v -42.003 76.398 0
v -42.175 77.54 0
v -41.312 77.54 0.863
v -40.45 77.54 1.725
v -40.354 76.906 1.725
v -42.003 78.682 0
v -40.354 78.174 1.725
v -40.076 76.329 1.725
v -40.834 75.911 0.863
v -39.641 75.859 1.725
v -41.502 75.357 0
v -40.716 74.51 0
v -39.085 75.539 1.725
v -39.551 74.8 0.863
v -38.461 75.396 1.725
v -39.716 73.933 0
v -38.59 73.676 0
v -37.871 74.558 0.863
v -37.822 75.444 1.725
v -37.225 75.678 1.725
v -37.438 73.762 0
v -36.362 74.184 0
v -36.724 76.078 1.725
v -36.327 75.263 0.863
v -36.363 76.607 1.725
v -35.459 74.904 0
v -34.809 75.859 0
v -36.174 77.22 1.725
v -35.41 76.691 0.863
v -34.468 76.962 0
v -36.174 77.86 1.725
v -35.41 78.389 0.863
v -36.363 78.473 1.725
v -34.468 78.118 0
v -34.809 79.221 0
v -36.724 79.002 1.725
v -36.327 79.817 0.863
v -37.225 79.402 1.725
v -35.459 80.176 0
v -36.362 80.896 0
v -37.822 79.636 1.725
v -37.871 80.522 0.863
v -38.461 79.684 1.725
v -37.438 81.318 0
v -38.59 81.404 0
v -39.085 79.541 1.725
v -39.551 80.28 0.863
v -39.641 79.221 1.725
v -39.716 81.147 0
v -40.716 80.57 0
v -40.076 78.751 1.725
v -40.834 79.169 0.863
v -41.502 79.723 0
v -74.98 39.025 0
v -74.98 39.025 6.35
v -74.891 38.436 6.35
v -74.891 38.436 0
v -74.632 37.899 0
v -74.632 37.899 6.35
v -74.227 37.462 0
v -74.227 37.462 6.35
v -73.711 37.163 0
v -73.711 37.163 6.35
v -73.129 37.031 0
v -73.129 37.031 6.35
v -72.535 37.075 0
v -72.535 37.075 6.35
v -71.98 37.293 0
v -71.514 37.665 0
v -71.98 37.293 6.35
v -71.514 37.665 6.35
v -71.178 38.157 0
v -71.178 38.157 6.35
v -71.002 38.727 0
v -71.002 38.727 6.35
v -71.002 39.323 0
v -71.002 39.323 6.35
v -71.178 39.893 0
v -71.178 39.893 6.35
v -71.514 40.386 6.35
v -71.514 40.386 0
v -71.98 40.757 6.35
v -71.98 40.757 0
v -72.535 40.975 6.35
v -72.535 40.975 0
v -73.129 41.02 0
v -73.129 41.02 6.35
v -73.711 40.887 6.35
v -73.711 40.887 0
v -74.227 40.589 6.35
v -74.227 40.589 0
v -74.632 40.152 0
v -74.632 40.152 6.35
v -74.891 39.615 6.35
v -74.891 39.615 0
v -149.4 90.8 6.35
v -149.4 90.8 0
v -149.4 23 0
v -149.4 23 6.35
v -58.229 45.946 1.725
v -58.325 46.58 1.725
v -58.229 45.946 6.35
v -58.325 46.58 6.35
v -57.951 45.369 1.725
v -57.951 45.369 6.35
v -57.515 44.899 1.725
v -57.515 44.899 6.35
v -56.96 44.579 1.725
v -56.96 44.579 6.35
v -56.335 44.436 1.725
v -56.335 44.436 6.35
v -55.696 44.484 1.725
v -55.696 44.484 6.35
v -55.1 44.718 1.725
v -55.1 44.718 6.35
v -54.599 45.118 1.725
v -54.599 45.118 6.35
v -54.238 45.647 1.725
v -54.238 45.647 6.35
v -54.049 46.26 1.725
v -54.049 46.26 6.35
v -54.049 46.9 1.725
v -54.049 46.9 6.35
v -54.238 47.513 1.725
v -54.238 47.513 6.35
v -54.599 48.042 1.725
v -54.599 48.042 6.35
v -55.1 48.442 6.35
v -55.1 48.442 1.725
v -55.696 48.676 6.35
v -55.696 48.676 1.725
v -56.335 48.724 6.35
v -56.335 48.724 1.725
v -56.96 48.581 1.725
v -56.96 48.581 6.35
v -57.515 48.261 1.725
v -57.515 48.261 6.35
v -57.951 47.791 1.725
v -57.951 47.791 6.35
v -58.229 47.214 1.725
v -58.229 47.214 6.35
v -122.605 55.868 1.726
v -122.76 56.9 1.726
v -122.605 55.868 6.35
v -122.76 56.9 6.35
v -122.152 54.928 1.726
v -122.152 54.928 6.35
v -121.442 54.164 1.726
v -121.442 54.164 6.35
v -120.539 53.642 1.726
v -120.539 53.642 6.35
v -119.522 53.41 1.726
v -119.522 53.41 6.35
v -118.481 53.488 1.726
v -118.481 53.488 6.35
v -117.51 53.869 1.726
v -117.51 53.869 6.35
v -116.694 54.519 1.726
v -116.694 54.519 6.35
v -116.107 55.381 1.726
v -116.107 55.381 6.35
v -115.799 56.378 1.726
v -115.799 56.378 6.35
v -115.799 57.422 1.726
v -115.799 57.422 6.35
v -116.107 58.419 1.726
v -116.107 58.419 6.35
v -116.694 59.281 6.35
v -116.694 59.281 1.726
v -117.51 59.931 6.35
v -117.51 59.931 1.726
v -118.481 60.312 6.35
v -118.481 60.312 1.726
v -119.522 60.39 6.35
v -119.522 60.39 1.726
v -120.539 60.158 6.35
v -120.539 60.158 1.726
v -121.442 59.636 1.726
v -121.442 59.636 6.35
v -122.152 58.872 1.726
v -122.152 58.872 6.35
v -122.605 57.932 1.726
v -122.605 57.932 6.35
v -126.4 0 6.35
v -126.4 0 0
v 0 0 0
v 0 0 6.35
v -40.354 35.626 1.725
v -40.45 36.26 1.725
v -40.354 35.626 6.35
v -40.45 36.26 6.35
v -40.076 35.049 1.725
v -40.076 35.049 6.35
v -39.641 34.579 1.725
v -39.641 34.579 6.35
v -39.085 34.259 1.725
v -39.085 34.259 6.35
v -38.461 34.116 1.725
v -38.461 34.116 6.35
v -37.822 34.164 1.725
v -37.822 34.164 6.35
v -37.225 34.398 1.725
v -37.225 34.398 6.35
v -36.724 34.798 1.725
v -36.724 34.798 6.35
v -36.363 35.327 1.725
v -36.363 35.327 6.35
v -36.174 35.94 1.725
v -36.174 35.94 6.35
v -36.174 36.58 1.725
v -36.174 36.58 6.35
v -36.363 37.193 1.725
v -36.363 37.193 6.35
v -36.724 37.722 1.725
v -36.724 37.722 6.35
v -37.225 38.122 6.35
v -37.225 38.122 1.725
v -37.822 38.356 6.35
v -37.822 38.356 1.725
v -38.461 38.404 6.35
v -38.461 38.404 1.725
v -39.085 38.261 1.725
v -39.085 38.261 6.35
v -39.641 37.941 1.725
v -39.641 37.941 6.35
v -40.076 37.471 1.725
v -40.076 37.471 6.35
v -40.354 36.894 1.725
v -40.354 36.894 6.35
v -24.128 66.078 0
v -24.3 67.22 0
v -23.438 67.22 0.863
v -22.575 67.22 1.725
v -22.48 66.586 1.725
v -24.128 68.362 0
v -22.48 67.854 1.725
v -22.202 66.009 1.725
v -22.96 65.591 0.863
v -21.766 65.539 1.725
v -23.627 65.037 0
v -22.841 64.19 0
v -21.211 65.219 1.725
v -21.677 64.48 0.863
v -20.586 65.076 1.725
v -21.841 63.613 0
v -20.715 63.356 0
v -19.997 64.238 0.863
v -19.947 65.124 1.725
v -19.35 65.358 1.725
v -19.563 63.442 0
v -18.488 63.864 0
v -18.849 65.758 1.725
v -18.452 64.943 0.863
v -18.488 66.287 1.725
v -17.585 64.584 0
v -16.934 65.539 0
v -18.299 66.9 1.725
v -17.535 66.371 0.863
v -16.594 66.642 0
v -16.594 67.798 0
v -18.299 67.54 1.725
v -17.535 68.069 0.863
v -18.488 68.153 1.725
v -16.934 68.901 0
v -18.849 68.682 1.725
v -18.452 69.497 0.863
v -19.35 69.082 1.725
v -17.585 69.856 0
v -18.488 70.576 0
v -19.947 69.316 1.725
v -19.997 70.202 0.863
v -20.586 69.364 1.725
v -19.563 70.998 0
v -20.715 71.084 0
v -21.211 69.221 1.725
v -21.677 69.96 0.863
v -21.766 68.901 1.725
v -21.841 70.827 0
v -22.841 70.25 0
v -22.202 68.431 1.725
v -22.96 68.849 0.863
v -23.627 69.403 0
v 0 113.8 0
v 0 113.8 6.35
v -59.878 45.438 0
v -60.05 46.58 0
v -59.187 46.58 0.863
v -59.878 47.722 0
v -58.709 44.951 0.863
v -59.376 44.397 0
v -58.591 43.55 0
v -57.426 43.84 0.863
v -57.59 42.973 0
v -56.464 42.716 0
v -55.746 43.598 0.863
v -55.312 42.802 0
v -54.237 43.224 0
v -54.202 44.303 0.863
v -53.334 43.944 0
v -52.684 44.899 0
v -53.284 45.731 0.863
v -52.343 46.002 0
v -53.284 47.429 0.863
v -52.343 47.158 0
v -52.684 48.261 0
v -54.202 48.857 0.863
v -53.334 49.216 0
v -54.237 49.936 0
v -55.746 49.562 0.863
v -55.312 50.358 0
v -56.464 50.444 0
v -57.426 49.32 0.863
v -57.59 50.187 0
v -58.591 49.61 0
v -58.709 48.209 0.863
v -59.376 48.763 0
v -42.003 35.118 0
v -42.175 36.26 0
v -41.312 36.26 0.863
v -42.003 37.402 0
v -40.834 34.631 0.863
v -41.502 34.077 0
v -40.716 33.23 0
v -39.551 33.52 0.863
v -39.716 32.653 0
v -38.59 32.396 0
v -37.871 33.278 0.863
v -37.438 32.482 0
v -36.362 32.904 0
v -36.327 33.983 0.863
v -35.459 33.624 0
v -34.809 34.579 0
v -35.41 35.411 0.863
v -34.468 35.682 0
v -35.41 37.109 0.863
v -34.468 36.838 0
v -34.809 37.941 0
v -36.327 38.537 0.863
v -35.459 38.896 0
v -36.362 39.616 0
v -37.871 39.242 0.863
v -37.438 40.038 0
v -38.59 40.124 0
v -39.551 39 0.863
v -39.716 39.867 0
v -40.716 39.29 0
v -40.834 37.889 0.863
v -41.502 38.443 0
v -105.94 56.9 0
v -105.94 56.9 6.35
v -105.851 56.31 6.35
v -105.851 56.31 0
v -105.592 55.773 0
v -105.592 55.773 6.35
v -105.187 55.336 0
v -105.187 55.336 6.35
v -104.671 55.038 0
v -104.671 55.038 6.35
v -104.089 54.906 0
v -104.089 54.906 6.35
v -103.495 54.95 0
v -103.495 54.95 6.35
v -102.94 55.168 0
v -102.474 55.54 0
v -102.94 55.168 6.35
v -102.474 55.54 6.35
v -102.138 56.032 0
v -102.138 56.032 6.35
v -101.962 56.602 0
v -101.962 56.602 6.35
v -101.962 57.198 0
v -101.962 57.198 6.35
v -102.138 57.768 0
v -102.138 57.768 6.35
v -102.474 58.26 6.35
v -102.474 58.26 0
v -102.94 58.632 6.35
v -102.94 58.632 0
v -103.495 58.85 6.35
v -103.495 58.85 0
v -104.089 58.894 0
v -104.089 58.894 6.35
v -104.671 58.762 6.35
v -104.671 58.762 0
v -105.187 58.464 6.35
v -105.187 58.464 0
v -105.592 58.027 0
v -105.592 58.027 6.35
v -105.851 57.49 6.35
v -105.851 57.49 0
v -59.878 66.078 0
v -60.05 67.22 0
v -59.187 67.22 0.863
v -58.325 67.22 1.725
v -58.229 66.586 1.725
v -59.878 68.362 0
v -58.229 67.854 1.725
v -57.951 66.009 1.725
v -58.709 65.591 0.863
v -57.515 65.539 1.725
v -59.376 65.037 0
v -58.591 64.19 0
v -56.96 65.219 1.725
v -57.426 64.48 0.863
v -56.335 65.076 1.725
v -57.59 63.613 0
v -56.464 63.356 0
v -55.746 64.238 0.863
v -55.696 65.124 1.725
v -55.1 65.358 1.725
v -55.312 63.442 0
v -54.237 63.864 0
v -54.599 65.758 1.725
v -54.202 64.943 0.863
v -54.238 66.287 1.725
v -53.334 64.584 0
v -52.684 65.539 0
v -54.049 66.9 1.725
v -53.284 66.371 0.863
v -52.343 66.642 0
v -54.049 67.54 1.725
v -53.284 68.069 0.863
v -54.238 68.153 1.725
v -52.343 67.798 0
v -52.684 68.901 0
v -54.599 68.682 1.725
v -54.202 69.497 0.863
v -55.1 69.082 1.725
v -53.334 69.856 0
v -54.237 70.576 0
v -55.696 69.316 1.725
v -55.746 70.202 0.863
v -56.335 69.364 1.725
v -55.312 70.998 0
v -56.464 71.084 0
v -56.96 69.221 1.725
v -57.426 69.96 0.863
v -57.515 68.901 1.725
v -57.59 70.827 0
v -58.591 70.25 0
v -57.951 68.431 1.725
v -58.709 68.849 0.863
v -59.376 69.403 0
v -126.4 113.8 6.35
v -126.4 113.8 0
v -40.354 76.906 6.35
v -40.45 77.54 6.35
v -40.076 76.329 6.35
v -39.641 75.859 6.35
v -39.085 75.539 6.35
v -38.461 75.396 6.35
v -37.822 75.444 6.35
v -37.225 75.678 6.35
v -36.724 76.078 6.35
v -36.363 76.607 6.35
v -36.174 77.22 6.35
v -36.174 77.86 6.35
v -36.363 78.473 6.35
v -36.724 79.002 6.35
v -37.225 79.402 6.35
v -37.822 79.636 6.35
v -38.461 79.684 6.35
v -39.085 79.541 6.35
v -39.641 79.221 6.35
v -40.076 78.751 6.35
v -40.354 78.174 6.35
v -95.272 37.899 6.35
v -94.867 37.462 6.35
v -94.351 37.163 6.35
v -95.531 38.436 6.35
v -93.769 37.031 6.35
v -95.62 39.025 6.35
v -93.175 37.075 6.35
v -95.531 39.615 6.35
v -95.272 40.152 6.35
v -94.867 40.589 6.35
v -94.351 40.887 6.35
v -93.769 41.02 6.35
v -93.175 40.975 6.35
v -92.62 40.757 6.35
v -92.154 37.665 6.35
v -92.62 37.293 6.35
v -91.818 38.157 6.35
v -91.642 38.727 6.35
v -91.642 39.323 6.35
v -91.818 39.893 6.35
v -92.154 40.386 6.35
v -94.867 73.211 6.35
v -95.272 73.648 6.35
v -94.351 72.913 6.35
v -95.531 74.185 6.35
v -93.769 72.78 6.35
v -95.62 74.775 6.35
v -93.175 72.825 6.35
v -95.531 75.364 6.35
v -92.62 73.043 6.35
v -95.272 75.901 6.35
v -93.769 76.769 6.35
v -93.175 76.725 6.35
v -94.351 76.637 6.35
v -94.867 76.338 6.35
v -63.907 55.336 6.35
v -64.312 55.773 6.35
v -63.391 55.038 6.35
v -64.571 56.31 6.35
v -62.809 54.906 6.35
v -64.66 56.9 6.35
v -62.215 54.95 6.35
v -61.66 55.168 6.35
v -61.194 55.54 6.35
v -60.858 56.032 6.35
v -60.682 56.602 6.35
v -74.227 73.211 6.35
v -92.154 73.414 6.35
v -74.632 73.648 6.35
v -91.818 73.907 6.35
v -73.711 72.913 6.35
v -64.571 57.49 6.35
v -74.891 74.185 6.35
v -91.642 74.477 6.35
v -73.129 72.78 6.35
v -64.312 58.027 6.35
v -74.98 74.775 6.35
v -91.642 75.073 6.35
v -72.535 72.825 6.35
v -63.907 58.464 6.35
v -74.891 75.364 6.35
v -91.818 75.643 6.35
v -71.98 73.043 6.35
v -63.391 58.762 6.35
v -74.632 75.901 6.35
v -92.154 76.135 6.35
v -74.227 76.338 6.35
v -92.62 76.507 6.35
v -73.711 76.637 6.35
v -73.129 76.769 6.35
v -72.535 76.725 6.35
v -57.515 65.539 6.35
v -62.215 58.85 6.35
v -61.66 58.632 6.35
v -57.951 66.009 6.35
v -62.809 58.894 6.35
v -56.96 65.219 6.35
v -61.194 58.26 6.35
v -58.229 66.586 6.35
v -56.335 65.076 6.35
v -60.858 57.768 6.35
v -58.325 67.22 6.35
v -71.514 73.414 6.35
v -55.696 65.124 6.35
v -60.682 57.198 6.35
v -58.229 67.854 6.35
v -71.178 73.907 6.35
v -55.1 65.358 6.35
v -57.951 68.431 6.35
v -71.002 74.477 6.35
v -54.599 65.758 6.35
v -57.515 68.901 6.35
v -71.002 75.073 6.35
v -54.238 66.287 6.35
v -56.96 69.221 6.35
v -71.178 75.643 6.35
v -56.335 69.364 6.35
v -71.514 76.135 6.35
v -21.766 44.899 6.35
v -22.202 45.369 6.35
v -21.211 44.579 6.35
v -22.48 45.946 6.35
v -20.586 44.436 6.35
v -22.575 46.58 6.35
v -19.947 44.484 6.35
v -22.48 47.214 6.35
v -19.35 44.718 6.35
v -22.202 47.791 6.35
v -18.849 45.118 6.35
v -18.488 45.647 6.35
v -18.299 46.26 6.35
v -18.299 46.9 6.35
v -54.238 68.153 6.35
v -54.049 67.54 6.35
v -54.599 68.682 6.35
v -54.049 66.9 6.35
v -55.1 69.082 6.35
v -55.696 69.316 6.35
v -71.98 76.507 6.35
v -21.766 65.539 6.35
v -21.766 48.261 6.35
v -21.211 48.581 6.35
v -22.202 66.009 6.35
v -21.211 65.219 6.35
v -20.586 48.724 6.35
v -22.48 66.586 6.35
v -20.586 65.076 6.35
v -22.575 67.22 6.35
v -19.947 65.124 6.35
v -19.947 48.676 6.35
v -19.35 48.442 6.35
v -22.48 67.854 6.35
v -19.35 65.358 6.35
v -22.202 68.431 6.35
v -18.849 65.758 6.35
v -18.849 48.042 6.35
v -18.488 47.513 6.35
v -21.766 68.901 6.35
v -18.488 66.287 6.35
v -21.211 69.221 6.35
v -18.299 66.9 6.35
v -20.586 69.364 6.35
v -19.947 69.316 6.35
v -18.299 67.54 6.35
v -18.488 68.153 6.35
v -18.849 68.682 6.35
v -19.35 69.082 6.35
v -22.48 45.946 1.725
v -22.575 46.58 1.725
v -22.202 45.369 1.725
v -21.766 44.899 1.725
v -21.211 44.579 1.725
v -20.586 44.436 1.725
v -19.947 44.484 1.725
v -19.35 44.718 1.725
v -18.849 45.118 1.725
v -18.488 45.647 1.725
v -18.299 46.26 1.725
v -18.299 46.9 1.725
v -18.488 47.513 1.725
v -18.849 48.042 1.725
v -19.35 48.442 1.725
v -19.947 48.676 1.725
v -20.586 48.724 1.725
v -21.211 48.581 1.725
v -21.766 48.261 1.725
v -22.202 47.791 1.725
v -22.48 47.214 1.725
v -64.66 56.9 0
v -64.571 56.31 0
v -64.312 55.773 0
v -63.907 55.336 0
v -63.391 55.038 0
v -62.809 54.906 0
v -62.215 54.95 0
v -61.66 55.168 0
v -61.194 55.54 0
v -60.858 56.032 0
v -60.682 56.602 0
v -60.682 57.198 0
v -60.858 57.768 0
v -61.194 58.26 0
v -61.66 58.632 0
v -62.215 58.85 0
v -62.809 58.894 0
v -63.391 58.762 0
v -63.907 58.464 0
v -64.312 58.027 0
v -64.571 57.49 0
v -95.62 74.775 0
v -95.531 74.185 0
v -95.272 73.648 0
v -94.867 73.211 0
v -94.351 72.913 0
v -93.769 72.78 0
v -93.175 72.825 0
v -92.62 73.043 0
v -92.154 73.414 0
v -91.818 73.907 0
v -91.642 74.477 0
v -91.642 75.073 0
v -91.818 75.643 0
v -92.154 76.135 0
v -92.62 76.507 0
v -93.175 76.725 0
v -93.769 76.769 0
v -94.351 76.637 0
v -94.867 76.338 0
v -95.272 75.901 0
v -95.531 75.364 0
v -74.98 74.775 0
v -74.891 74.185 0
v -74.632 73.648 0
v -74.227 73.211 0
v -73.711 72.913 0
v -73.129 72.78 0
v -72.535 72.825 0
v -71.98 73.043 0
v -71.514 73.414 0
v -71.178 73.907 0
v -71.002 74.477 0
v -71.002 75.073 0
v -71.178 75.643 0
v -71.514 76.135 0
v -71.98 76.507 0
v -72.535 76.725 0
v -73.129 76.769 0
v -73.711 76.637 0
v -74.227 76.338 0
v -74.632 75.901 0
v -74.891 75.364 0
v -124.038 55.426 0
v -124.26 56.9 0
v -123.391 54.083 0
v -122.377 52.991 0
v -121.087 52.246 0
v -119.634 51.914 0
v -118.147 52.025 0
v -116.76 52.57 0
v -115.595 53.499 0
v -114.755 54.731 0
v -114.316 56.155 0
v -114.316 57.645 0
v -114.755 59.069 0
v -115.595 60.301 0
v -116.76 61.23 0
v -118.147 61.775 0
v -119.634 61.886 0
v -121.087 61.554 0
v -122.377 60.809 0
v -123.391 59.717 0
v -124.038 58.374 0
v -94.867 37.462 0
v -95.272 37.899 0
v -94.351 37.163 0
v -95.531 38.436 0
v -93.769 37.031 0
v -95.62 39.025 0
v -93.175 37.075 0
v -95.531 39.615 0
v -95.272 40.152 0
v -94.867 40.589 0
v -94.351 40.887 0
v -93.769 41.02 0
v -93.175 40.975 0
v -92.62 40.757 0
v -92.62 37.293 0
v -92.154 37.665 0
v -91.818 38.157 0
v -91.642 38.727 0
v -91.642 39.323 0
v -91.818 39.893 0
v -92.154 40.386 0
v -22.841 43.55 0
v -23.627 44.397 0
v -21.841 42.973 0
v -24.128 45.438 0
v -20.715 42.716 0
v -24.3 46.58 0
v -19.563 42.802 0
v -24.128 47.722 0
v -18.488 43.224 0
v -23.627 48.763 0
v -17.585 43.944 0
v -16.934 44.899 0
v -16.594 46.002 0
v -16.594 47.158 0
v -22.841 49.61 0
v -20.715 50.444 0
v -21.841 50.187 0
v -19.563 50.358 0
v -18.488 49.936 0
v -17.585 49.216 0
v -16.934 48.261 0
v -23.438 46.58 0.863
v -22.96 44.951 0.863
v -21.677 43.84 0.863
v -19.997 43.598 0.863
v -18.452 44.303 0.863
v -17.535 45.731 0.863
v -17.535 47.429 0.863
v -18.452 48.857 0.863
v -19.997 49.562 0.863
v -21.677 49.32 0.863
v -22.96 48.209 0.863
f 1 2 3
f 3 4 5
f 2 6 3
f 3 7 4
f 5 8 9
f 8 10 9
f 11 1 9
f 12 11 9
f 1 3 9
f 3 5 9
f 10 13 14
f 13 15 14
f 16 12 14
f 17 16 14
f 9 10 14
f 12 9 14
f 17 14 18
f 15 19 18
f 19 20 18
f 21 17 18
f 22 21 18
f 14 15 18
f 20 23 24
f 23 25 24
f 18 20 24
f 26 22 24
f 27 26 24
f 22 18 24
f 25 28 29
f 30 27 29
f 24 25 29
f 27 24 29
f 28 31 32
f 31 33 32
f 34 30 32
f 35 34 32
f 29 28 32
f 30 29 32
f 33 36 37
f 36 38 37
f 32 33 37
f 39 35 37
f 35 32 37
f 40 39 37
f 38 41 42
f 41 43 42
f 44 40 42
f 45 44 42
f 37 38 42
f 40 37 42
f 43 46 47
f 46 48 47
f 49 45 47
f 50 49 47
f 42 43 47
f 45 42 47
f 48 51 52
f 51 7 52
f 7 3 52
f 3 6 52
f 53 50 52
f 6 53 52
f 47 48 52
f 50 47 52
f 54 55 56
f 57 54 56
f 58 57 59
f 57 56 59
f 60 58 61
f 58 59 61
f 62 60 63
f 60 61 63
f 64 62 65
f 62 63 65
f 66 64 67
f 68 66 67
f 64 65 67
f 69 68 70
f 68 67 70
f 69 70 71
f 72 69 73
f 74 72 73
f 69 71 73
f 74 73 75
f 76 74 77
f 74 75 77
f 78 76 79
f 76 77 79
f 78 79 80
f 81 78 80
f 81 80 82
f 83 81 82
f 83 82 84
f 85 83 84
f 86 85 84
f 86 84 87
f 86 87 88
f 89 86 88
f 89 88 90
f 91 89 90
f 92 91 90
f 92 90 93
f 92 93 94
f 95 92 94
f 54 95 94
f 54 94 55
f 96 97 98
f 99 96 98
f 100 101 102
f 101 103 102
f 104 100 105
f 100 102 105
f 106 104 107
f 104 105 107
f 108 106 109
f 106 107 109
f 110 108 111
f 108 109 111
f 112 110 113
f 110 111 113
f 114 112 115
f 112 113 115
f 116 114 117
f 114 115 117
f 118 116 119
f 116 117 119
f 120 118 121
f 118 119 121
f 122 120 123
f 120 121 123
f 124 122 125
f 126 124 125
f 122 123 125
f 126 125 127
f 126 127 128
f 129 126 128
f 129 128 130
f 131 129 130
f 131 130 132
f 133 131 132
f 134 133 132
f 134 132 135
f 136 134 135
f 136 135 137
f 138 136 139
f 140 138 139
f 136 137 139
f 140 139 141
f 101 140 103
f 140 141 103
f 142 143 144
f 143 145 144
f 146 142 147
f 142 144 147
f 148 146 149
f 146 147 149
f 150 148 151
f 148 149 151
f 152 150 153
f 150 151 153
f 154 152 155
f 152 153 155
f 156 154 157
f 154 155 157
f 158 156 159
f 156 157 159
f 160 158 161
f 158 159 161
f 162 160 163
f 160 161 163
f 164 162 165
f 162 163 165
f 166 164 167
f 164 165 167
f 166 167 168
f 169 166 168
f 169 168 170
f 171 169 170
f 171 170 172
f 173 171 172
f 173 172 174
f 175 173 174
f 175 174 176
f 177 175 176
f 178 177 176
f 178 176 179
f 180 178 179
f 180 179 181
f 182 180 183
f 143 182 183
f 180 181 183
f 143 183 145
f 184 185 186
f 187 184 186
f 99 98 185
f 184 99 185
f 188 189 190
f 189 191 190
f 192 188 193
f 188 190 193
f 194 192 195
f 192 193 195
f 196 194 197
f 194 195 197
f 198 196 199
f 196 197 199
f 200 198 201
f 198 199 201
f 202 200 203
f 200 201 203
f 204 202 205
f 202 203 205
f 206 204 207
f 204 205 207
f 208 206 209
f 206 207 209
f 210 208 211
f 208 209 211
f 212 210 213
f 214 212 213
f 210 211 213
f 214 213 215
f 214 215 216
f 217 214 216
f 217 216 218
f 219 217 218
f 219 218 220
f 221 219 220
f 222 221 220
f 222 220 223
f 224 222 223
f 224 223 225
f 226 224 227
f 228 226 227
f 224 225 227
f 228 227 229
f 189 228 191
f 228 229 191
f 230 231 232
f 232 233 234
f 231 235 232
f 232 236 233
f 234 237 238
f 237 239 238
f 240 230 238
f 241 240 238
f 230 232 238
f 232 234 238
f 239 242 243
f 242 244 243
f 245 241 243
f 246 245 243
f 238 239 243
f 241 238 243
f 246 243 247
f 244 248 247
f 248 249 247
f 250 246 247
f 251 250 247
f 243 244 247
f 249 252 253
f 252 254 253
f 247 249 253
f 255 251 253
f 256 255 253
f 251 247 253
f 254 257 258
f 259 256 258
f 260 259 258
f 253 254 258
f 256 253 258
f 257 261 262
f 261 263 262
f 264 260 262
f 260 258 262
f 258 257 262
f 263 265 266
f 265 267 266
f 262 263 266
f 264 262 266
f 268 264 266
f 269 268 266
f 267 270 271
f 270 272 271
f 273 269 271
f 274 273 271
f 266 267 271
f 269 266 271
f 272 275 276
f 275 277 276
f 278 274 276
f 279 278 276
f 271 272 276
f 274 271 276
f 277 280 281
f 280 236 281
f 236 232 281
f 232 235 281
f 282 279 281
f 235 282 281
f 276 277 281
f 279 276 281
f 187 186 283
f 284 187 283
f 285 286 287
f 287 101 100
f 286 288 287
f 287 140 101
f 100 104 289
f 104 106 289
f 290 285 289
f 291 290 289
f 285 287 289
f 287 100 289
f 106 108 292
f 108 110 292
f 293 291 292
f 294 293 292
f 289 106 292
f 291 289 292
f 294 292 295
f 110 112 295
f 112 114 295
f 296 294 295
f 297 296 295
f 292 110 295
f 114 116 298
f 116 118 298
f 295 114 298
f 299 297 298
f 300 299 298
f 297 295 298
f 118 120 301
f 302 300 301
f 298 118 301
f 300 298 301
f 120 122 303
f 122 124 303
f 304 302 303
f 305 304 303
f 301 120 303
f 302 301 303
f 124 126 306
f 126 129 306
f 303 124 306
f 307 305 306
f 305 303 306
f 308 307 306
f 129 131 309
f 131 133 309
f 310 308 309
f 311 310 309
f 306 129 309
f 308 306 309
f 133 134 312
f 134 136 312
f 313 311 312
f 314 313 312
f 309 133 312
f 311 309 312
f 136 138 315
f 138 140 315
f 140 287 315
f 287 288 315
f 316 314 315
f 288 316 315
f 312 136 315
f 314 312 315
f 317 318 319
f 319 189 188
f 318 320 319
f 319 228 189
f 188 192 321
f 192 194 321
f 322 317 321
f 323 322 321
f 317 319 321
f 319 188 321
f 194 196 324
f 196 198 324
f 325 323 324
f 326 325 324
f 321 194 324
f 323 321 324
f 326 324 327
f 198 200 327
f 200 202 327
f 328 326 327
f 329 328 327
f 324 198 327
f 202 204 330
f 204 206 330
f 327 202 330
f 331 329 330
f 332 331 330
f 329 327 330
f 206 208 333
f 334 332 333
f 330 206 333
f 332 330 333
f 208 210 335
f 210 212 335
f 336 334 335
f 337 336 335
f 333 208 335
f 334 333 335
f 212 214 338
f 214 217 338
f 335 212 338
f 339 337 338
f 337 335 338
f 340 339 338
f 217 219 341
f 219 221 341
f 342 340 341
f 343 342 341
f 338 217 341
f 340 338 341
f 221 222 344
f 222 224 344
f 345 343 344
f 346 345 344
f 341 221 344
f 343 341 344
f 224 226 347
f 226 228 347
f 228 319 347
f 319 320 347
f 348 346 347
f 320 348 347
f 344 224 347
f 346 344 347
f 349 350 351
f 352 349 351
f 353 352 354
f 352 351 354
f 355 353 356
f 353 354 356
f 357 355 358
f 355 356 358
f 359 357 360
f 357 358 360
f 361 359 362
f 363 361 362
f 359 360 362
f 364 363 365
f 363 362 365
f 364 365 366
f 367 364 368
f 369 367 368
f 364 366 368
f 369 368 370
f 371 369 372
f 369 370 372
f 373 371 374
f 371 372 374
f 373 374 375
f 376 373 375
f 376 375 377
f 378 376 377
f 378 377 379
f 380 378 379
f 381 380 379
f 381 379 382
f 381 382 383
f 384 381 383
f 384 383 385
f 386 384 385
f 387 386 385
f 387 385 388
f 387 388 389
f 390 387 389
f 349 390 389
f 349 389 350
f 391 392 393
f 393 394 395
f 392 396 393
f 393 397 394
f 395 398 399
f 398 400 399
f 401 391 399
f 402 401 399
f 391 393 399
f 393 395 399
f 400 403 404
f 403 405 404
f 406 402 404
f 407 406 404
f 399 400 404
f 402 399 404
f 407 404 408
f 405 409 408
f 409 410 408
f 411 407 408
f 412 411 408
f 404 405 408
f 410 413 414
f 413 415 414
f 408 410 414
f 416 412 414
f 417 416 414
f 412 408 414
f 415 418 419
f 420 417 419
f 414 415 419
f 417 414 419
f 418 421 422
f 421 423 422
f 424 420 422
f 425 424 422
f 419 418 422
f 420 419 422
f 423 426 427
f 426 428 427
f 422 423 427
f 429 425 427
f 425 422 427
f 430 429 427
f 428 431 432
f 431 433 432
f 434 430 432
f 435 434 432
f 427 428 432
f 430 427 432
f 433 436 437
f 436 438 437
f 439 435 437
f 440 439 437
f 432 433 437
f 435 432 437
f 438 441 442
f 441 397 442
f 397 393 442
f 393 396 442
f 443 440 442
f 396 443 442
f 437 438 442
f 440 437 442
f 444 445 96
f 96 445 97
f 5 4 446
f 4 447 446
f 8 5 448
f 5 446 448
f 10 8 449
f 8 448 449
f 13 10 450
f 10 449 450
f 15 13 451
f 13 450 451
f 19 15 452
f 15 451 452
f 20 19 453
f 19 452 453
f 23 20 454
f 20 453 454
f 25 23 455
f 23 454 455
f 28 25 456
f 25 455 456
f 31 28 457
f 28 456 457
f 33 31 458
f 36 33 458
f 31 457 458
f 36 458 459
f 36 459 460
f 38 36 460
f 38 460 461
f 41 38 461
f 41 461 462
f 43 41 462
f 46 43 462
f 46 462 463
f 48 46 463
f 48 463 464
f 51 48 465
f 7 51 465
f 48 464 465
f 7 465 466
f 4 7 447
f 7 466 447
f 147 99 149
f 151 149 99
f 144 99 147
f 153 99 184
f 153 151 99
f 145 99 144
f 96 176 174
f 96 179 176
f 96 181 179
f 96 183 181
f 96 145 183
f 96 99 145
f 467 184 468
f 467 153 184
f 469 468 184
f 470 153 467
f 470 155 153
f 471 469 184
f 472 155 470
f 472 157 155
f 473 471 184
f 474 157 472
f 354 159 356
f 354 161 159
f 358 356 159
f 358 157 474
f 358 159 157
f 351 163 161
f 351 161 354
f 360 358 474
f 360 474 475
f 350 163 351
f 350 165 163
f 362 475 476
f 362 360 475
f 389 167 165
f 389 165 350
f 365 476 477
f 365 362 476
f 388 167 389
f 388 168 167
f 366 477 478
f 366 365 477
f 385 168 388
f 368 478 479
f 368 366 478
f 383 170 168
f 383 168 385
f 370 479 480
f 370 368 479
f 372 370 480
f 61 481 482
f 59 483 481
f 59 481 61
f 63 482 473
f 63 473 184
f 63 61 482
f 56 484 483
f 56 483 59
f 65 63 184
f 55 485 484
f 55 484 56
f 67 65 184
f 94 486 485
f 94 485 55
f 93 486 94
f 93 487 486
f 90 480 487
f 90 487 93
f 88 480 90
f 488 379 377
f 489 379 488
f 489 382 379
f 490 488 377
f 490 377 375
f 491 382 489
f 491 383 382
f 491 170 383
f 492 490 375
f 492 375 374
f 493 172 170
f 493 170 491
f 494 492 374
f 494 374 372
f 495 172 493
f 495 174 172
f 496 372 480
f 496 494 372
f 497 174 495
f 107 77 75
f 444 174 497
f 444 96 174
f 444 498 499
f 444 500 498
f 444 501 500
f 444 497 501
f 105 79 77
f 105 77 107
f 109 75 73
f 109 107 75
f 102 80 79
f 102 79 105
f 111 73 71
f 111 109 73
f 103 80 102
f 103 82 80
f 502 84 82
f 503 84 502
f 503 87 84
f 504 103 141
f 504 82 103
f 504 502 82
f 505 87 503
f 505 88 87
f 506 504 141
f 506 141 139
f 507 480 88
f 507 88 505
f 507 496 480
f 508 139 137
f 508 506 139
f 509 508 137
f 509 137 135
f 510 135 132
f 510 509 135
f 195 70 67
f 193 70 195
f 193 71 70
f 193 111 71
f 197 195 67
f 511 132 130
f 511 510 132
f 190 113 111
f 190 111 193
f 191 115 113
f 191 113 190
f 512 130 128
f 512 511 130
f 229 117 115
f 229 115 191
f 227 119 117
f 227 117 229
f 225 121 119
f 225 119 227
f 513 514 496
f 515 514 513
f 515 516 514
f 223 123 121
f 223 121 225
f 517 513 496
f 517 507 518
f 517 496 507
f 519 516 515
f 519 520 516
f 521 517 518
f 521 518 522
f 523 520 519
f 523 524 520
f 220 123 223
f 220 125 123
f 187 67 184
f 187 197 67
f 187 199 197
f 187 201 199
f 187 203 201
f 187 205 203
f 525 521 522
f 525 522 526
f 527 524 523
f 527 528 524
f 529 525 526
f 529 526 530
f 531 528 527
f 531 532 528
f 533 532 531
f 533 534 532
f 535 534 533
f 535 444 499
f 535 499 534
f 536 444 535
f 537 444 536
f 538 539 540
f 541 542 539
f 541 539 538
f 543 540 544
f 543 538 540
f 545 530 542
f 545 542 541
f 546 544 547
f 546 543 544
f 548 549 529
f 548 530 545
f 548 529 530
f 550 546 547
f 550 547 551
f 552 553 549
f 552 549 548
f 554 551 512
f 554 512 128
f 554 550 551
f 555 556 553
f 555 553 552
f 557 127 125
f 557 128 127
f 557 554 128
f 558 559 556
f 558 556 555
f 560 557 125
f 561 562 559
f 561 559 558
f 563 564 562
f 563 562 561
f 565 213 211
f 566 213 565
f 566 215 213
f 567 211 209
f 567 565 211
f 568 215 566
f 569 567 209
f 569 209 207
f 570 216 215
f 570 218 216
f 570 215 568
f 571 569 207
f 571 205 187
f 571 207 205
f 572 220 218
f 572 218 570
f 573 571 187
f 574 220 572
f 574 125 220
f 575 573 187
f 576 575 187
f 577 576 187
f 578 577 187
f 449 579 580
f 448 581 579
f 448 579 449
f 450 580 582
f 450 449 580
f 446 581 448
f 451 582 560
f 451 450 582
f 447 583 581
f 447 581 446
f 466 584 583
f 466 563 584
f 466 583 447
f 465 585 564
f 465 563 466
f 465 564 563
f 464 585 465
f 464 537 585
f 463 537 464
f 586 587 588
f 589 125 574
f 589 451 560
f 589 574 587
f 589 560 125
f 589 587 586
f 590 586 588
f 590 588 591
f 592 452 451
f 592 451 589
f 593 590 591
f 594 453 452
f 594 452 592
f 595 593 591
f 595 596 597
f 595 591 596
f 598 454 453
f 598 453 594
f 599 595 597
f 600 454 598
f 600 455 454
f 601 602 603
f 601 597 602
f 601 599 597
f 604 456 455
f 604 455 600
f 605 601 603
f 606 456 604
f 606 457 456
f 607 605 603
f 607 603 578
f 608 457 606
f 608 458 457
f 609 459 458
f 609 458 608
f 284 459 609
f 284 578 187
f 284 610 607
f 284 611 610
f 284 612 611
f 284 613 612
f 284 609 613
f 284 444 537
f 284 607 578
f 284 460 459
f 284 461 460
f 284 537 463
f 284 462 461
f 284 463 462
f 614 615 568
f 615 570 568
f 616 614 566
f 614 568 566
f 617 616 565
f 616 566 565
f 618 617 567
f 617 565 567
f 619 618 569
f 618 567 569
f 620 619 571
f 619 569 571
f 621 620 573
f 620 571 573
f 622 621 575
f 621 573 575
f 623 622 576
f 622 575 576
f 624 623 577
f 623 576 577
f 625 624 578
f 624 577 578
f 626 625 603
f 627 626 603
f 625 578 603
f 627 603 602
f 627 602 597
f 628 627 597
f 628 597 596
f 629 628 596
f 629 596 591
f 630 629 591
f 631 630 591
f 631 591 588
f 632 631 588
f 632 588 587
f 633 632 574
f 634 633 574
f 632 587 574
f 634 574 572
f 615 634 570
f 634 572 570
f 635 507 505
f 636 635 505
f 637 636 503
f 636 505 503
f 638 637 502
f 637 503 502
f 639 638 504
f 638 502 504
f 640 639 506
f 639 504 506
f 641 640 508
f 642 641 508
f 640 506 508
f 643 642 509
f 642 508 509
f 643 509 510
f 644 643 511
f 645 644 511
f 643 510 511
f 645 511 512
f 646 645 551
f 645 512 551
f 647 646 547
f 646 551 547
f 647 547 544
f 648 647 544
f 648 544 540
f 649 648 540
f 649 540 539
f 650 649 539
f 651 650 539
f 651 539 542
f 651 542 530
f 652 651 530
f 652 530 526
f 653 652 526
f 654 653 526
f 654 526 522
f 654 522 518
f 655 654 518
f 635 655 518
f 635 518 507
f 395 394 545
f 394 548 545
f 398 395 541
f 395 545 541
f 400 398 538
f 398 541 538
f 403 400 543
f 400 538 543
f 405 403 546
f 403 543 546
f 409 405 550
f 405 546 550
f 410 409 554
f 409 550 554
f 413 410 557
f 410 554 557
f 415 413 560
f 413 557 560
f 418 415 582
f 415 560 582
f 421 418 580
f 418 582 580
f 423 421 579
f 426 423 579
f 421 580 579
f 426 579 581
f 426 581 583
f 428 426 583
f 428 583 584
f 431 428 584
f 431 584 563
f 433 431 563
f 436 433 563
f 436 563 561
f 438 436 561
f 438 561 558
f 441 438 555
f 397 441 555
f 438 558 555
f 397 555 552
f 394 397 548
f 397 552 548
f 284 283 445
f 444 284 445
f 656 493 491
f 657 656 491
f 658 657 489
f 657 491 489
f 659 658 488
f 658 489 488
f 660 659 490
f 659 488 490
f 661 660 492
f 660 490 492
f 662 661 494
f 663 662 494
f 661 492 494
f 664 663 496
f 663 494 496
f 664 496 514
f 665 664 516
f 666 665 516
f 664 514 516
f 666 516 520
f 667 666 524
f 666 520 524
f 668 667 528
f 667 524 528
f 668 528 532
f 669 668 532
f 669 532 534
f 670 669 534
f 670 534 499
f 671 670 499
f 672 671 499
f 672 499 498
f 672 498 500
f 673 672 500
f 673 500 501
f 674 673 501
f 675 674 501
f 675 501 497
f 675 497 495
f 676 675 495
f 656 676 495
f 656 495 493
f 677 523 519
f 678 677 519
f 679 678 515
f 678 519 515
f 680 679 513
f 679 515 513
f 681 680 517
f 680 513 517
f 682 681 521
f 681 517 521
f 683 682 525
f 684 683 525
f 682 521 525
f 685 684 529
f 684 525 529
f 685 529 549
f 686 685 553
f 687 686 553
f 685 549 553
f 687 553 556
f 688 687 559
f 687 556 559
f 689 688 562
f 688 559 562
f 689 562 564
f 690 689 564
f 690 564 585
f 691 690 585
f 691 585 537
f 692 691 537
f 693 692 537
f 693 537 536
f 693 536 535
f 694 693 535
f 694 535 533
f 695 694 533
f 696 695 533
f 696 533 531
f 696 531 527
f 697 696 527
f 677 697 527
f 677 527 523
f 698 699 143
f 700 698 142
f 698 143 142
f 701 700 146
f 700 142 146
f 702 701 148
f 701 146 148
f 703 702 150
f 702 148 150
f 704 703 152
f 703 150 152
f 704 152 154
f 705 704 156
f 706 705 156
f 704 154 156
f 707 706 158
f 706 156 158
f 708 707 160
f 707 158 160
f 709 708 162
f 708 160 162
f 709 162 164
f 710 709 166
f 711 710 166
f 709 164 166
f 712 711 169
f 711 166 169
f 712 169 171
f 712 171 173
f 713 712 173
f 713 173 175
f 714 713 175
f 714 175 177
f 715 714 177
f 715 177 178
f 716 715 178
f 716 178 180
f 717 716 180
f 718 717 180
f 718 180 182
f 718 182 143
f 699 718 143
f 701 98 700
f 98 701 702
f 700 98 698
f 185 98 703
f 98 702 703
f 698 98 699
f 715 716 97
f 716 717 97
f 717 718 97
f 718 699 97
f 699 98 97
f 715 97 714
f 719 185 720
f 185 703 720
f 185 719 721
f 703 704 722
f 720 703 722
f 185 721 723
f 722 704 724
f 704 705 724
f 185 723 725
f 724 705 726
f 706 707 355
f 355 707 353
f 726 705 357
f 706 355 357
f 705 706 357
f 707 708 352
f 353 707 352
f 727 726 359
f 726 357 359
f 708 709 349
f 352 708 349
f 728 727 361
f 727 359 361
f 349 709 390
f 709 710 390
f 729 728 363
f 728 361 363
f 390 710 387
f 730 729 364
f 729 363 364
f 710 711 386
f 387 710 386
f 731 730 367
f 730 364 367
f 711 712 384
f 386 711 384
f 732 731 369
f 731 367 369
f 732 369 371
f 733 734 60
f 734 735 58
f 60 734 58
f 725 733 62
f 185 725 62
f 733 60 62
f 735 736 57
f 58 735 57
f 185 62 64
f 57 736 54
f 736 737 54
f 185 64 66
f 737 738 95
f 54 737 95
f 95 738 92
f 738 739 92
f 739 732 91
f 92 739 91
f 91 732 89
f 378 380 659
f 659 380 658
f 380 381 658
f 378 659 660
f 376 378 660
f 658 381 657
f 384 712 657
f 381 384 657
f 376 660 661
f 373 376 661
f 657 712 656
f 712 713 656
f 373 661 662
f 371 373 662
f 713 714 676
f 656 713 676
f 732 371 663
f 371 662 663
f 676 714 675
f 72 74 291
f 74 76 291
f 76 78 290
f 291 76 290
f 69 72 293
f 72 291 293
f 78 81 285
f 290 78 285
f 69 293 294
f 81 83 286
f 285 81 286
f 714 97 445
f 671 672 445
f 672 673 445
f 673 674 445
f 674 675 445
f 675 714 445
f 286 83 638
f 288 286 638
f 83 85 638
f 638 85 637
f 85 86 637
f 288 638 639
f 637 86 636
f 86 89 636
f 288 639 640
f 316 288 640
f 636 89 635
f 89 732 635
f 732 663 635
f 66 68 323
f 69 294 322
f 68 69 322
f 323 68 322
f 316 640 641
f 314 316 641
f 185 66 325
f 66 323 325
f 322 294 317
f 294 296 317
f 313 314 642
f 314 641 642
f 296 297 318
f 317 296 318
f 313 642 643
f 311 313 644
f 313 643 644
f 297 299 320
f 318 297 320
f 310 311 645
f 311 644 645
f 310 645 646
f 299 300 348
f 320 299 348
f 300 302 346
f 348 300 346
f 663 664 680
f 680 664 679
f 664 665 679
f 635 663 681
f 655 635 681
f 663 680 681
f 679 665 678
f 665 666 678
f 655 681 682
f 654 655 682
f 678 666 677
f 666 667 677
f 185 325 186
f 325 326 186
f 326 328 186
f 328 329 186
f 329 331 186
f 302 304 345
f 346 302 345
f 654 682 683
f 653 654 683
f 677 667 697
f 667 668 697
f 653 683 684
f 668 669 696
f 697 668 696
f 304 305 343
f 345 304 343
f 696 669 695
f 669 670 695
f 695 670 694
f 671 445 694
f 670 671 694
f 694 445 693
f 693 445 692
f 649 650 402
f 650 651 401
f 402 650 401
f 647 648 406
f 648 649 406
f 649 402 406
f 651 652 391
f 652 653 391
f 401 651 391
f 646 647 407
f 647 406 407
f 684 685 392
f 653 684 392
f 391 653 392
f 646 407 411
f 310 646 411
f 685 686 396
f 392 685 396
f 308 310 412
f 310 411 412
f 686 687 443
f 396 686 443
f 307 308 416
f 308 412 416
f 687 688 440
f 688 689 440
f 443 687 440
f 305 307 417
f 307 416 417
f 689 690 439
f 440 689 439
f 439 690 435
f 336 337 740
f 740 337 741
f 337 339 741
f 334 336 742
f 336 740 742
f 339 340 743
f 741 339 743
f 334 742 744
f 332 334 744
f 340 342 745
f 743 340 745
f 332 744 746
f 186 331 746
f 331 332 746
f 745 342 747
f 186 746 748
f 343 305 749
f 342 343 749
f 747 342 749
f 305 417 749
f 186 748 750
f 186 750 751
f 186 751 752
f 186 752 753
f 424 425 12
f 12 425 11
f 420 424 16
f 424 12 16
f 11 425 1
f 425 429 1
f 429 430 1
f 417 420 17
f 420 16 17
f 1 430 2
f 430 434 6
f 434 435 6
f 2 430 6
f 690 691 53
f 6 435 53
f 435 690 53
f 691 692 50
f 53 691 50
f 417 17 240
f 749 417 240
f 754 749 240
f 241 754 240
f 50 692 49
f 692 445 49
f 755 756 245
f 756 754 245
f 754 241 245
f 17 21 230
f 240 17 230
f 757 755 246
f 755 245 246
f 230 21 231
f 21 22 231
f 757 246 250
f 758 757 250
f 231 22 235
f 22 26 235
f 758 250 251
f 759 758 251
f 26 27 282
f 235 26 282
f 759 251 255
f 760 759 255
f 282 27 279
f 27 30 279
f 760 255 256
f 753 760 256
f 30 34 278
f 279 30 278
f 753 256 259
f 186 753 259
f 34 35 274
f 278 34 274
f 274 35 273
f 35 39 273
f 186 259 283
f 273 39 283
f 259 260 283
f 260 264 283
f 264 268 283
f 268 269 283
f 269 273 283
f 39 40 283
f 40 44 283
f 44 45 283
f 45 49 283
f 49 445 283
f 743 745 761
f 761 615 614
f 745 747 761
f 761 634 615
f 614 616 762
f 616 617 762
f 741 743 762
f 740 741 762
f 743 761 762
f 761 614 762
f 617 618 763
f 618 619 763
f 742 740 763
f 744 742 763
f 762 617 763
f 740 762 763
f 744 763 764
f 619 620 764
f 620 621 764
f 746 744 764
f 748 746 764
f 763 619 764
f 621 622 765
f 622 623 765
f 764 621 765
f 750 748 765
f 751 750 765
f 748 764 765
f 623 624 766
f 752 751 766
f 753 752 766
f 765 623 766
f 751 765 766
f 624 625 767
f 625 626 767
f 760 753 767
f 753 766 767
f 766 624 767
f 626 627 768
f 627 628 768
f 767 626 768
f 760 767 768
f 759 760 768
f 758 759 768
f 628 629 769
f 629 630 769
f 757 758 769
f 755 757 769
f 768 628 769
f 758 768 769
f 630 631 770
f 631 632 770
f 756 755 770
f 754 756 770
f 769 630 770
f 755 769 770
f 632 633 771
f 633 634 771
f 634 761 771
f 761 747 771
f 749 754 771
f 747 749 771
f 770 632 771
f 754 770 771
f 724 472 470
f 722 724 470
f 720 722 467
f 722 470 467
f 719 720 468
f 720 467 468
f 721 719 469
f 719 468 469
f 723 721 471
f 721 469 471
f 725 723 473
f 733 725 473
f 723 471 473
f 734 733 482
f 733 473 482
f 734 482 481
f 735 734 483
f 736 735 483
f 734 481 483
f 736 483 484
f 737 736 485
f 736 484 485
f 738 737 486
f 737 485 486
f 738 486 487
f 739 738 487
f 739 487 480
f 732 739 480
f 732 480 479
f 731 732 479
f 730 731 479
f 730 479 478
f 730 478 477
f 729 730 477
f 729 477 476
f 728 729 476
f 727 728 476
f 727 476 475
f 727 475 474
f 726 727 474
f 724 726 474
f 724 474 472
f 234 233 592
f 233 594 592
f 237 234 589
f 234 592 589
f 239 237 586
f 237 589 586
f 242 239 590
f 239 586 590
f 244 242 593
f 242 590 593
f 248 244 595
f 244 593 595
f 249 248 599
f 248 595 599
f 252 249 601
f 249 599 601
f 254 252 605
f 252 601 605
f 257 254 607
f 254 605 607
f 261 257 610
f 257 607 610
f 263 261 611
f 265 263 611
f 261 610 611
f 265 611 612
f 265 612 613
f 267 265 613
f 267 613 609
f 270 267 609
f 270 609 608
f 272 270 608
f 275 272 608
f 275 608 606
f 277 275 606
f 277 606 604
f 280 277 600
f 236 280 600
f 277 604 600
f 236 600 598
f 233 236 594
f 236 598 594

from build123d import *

# Parameters (mm, degrees)
F1_DEPTH       = 6.35
F2_D           = 7
F2_CSINK_D     = 10
F2_CSINK_ANGLE = 82
F3_D           = 4.3
F3_CSINK_D     = 7.75
F3_CSINK_ANGLE = 90
F4_D           = 4


with BuildPart() as f1:
    # F0 (on Top) → F1 (new body)
    with BuildSketch(Plane.XY):
        Polygon((-149.4, 23), (-126.4, 0), (0, 0), (0, 113.8), (-126.4, 113.8), (-149.4, 90.8), align=None)
    extrude(amount=F1_DEPTH)

    # F2 (through all)
    with Locations(Plane(origin=(0, 0, 0), x_dir=(1, 0, 0), z_dir=(0, 0, -1))):
        with Locations((-119.26, -56.9)):
            CounterSinkHole(F2_D / 2, F2_CSINK_D / 2, counter_sink_angle=F2_CSINK_ANGLE)

    # F3 (through all)
    with Locations(Plane(origin=(0, 0, 0), x_dir=(1, 0, 0), z_dir=(0, 0, -1))):
        with Locations((-38.3, -36.26), (-20.4252356659, -46.58), (-20.4252356659, -67.22), (-38.3, -77.54), (-56.1747643341, -67.22), (-56.1747643341, -46.58)):
            CounterSinkHole(F3_D / 2, F3_CSINK_D / 2, counter_sink_angle=F3_CSINK_ANGLE)

    # F4 (through all)
    with Locations(Plane(origin=(0, 0, 0), x_dir=(1, 0, 0), z_dir=(0, 0, -1))):
        with Locations((-103.94, -56.9), (-93.62, -39.0252356659), (-72.98, -39.0252356659), (-62.66, -56.9), (-72.98, -74.7747643341), (-93.62, -74.7747643341)):
            Hole(F4_D / 2)


solid = f1.part
